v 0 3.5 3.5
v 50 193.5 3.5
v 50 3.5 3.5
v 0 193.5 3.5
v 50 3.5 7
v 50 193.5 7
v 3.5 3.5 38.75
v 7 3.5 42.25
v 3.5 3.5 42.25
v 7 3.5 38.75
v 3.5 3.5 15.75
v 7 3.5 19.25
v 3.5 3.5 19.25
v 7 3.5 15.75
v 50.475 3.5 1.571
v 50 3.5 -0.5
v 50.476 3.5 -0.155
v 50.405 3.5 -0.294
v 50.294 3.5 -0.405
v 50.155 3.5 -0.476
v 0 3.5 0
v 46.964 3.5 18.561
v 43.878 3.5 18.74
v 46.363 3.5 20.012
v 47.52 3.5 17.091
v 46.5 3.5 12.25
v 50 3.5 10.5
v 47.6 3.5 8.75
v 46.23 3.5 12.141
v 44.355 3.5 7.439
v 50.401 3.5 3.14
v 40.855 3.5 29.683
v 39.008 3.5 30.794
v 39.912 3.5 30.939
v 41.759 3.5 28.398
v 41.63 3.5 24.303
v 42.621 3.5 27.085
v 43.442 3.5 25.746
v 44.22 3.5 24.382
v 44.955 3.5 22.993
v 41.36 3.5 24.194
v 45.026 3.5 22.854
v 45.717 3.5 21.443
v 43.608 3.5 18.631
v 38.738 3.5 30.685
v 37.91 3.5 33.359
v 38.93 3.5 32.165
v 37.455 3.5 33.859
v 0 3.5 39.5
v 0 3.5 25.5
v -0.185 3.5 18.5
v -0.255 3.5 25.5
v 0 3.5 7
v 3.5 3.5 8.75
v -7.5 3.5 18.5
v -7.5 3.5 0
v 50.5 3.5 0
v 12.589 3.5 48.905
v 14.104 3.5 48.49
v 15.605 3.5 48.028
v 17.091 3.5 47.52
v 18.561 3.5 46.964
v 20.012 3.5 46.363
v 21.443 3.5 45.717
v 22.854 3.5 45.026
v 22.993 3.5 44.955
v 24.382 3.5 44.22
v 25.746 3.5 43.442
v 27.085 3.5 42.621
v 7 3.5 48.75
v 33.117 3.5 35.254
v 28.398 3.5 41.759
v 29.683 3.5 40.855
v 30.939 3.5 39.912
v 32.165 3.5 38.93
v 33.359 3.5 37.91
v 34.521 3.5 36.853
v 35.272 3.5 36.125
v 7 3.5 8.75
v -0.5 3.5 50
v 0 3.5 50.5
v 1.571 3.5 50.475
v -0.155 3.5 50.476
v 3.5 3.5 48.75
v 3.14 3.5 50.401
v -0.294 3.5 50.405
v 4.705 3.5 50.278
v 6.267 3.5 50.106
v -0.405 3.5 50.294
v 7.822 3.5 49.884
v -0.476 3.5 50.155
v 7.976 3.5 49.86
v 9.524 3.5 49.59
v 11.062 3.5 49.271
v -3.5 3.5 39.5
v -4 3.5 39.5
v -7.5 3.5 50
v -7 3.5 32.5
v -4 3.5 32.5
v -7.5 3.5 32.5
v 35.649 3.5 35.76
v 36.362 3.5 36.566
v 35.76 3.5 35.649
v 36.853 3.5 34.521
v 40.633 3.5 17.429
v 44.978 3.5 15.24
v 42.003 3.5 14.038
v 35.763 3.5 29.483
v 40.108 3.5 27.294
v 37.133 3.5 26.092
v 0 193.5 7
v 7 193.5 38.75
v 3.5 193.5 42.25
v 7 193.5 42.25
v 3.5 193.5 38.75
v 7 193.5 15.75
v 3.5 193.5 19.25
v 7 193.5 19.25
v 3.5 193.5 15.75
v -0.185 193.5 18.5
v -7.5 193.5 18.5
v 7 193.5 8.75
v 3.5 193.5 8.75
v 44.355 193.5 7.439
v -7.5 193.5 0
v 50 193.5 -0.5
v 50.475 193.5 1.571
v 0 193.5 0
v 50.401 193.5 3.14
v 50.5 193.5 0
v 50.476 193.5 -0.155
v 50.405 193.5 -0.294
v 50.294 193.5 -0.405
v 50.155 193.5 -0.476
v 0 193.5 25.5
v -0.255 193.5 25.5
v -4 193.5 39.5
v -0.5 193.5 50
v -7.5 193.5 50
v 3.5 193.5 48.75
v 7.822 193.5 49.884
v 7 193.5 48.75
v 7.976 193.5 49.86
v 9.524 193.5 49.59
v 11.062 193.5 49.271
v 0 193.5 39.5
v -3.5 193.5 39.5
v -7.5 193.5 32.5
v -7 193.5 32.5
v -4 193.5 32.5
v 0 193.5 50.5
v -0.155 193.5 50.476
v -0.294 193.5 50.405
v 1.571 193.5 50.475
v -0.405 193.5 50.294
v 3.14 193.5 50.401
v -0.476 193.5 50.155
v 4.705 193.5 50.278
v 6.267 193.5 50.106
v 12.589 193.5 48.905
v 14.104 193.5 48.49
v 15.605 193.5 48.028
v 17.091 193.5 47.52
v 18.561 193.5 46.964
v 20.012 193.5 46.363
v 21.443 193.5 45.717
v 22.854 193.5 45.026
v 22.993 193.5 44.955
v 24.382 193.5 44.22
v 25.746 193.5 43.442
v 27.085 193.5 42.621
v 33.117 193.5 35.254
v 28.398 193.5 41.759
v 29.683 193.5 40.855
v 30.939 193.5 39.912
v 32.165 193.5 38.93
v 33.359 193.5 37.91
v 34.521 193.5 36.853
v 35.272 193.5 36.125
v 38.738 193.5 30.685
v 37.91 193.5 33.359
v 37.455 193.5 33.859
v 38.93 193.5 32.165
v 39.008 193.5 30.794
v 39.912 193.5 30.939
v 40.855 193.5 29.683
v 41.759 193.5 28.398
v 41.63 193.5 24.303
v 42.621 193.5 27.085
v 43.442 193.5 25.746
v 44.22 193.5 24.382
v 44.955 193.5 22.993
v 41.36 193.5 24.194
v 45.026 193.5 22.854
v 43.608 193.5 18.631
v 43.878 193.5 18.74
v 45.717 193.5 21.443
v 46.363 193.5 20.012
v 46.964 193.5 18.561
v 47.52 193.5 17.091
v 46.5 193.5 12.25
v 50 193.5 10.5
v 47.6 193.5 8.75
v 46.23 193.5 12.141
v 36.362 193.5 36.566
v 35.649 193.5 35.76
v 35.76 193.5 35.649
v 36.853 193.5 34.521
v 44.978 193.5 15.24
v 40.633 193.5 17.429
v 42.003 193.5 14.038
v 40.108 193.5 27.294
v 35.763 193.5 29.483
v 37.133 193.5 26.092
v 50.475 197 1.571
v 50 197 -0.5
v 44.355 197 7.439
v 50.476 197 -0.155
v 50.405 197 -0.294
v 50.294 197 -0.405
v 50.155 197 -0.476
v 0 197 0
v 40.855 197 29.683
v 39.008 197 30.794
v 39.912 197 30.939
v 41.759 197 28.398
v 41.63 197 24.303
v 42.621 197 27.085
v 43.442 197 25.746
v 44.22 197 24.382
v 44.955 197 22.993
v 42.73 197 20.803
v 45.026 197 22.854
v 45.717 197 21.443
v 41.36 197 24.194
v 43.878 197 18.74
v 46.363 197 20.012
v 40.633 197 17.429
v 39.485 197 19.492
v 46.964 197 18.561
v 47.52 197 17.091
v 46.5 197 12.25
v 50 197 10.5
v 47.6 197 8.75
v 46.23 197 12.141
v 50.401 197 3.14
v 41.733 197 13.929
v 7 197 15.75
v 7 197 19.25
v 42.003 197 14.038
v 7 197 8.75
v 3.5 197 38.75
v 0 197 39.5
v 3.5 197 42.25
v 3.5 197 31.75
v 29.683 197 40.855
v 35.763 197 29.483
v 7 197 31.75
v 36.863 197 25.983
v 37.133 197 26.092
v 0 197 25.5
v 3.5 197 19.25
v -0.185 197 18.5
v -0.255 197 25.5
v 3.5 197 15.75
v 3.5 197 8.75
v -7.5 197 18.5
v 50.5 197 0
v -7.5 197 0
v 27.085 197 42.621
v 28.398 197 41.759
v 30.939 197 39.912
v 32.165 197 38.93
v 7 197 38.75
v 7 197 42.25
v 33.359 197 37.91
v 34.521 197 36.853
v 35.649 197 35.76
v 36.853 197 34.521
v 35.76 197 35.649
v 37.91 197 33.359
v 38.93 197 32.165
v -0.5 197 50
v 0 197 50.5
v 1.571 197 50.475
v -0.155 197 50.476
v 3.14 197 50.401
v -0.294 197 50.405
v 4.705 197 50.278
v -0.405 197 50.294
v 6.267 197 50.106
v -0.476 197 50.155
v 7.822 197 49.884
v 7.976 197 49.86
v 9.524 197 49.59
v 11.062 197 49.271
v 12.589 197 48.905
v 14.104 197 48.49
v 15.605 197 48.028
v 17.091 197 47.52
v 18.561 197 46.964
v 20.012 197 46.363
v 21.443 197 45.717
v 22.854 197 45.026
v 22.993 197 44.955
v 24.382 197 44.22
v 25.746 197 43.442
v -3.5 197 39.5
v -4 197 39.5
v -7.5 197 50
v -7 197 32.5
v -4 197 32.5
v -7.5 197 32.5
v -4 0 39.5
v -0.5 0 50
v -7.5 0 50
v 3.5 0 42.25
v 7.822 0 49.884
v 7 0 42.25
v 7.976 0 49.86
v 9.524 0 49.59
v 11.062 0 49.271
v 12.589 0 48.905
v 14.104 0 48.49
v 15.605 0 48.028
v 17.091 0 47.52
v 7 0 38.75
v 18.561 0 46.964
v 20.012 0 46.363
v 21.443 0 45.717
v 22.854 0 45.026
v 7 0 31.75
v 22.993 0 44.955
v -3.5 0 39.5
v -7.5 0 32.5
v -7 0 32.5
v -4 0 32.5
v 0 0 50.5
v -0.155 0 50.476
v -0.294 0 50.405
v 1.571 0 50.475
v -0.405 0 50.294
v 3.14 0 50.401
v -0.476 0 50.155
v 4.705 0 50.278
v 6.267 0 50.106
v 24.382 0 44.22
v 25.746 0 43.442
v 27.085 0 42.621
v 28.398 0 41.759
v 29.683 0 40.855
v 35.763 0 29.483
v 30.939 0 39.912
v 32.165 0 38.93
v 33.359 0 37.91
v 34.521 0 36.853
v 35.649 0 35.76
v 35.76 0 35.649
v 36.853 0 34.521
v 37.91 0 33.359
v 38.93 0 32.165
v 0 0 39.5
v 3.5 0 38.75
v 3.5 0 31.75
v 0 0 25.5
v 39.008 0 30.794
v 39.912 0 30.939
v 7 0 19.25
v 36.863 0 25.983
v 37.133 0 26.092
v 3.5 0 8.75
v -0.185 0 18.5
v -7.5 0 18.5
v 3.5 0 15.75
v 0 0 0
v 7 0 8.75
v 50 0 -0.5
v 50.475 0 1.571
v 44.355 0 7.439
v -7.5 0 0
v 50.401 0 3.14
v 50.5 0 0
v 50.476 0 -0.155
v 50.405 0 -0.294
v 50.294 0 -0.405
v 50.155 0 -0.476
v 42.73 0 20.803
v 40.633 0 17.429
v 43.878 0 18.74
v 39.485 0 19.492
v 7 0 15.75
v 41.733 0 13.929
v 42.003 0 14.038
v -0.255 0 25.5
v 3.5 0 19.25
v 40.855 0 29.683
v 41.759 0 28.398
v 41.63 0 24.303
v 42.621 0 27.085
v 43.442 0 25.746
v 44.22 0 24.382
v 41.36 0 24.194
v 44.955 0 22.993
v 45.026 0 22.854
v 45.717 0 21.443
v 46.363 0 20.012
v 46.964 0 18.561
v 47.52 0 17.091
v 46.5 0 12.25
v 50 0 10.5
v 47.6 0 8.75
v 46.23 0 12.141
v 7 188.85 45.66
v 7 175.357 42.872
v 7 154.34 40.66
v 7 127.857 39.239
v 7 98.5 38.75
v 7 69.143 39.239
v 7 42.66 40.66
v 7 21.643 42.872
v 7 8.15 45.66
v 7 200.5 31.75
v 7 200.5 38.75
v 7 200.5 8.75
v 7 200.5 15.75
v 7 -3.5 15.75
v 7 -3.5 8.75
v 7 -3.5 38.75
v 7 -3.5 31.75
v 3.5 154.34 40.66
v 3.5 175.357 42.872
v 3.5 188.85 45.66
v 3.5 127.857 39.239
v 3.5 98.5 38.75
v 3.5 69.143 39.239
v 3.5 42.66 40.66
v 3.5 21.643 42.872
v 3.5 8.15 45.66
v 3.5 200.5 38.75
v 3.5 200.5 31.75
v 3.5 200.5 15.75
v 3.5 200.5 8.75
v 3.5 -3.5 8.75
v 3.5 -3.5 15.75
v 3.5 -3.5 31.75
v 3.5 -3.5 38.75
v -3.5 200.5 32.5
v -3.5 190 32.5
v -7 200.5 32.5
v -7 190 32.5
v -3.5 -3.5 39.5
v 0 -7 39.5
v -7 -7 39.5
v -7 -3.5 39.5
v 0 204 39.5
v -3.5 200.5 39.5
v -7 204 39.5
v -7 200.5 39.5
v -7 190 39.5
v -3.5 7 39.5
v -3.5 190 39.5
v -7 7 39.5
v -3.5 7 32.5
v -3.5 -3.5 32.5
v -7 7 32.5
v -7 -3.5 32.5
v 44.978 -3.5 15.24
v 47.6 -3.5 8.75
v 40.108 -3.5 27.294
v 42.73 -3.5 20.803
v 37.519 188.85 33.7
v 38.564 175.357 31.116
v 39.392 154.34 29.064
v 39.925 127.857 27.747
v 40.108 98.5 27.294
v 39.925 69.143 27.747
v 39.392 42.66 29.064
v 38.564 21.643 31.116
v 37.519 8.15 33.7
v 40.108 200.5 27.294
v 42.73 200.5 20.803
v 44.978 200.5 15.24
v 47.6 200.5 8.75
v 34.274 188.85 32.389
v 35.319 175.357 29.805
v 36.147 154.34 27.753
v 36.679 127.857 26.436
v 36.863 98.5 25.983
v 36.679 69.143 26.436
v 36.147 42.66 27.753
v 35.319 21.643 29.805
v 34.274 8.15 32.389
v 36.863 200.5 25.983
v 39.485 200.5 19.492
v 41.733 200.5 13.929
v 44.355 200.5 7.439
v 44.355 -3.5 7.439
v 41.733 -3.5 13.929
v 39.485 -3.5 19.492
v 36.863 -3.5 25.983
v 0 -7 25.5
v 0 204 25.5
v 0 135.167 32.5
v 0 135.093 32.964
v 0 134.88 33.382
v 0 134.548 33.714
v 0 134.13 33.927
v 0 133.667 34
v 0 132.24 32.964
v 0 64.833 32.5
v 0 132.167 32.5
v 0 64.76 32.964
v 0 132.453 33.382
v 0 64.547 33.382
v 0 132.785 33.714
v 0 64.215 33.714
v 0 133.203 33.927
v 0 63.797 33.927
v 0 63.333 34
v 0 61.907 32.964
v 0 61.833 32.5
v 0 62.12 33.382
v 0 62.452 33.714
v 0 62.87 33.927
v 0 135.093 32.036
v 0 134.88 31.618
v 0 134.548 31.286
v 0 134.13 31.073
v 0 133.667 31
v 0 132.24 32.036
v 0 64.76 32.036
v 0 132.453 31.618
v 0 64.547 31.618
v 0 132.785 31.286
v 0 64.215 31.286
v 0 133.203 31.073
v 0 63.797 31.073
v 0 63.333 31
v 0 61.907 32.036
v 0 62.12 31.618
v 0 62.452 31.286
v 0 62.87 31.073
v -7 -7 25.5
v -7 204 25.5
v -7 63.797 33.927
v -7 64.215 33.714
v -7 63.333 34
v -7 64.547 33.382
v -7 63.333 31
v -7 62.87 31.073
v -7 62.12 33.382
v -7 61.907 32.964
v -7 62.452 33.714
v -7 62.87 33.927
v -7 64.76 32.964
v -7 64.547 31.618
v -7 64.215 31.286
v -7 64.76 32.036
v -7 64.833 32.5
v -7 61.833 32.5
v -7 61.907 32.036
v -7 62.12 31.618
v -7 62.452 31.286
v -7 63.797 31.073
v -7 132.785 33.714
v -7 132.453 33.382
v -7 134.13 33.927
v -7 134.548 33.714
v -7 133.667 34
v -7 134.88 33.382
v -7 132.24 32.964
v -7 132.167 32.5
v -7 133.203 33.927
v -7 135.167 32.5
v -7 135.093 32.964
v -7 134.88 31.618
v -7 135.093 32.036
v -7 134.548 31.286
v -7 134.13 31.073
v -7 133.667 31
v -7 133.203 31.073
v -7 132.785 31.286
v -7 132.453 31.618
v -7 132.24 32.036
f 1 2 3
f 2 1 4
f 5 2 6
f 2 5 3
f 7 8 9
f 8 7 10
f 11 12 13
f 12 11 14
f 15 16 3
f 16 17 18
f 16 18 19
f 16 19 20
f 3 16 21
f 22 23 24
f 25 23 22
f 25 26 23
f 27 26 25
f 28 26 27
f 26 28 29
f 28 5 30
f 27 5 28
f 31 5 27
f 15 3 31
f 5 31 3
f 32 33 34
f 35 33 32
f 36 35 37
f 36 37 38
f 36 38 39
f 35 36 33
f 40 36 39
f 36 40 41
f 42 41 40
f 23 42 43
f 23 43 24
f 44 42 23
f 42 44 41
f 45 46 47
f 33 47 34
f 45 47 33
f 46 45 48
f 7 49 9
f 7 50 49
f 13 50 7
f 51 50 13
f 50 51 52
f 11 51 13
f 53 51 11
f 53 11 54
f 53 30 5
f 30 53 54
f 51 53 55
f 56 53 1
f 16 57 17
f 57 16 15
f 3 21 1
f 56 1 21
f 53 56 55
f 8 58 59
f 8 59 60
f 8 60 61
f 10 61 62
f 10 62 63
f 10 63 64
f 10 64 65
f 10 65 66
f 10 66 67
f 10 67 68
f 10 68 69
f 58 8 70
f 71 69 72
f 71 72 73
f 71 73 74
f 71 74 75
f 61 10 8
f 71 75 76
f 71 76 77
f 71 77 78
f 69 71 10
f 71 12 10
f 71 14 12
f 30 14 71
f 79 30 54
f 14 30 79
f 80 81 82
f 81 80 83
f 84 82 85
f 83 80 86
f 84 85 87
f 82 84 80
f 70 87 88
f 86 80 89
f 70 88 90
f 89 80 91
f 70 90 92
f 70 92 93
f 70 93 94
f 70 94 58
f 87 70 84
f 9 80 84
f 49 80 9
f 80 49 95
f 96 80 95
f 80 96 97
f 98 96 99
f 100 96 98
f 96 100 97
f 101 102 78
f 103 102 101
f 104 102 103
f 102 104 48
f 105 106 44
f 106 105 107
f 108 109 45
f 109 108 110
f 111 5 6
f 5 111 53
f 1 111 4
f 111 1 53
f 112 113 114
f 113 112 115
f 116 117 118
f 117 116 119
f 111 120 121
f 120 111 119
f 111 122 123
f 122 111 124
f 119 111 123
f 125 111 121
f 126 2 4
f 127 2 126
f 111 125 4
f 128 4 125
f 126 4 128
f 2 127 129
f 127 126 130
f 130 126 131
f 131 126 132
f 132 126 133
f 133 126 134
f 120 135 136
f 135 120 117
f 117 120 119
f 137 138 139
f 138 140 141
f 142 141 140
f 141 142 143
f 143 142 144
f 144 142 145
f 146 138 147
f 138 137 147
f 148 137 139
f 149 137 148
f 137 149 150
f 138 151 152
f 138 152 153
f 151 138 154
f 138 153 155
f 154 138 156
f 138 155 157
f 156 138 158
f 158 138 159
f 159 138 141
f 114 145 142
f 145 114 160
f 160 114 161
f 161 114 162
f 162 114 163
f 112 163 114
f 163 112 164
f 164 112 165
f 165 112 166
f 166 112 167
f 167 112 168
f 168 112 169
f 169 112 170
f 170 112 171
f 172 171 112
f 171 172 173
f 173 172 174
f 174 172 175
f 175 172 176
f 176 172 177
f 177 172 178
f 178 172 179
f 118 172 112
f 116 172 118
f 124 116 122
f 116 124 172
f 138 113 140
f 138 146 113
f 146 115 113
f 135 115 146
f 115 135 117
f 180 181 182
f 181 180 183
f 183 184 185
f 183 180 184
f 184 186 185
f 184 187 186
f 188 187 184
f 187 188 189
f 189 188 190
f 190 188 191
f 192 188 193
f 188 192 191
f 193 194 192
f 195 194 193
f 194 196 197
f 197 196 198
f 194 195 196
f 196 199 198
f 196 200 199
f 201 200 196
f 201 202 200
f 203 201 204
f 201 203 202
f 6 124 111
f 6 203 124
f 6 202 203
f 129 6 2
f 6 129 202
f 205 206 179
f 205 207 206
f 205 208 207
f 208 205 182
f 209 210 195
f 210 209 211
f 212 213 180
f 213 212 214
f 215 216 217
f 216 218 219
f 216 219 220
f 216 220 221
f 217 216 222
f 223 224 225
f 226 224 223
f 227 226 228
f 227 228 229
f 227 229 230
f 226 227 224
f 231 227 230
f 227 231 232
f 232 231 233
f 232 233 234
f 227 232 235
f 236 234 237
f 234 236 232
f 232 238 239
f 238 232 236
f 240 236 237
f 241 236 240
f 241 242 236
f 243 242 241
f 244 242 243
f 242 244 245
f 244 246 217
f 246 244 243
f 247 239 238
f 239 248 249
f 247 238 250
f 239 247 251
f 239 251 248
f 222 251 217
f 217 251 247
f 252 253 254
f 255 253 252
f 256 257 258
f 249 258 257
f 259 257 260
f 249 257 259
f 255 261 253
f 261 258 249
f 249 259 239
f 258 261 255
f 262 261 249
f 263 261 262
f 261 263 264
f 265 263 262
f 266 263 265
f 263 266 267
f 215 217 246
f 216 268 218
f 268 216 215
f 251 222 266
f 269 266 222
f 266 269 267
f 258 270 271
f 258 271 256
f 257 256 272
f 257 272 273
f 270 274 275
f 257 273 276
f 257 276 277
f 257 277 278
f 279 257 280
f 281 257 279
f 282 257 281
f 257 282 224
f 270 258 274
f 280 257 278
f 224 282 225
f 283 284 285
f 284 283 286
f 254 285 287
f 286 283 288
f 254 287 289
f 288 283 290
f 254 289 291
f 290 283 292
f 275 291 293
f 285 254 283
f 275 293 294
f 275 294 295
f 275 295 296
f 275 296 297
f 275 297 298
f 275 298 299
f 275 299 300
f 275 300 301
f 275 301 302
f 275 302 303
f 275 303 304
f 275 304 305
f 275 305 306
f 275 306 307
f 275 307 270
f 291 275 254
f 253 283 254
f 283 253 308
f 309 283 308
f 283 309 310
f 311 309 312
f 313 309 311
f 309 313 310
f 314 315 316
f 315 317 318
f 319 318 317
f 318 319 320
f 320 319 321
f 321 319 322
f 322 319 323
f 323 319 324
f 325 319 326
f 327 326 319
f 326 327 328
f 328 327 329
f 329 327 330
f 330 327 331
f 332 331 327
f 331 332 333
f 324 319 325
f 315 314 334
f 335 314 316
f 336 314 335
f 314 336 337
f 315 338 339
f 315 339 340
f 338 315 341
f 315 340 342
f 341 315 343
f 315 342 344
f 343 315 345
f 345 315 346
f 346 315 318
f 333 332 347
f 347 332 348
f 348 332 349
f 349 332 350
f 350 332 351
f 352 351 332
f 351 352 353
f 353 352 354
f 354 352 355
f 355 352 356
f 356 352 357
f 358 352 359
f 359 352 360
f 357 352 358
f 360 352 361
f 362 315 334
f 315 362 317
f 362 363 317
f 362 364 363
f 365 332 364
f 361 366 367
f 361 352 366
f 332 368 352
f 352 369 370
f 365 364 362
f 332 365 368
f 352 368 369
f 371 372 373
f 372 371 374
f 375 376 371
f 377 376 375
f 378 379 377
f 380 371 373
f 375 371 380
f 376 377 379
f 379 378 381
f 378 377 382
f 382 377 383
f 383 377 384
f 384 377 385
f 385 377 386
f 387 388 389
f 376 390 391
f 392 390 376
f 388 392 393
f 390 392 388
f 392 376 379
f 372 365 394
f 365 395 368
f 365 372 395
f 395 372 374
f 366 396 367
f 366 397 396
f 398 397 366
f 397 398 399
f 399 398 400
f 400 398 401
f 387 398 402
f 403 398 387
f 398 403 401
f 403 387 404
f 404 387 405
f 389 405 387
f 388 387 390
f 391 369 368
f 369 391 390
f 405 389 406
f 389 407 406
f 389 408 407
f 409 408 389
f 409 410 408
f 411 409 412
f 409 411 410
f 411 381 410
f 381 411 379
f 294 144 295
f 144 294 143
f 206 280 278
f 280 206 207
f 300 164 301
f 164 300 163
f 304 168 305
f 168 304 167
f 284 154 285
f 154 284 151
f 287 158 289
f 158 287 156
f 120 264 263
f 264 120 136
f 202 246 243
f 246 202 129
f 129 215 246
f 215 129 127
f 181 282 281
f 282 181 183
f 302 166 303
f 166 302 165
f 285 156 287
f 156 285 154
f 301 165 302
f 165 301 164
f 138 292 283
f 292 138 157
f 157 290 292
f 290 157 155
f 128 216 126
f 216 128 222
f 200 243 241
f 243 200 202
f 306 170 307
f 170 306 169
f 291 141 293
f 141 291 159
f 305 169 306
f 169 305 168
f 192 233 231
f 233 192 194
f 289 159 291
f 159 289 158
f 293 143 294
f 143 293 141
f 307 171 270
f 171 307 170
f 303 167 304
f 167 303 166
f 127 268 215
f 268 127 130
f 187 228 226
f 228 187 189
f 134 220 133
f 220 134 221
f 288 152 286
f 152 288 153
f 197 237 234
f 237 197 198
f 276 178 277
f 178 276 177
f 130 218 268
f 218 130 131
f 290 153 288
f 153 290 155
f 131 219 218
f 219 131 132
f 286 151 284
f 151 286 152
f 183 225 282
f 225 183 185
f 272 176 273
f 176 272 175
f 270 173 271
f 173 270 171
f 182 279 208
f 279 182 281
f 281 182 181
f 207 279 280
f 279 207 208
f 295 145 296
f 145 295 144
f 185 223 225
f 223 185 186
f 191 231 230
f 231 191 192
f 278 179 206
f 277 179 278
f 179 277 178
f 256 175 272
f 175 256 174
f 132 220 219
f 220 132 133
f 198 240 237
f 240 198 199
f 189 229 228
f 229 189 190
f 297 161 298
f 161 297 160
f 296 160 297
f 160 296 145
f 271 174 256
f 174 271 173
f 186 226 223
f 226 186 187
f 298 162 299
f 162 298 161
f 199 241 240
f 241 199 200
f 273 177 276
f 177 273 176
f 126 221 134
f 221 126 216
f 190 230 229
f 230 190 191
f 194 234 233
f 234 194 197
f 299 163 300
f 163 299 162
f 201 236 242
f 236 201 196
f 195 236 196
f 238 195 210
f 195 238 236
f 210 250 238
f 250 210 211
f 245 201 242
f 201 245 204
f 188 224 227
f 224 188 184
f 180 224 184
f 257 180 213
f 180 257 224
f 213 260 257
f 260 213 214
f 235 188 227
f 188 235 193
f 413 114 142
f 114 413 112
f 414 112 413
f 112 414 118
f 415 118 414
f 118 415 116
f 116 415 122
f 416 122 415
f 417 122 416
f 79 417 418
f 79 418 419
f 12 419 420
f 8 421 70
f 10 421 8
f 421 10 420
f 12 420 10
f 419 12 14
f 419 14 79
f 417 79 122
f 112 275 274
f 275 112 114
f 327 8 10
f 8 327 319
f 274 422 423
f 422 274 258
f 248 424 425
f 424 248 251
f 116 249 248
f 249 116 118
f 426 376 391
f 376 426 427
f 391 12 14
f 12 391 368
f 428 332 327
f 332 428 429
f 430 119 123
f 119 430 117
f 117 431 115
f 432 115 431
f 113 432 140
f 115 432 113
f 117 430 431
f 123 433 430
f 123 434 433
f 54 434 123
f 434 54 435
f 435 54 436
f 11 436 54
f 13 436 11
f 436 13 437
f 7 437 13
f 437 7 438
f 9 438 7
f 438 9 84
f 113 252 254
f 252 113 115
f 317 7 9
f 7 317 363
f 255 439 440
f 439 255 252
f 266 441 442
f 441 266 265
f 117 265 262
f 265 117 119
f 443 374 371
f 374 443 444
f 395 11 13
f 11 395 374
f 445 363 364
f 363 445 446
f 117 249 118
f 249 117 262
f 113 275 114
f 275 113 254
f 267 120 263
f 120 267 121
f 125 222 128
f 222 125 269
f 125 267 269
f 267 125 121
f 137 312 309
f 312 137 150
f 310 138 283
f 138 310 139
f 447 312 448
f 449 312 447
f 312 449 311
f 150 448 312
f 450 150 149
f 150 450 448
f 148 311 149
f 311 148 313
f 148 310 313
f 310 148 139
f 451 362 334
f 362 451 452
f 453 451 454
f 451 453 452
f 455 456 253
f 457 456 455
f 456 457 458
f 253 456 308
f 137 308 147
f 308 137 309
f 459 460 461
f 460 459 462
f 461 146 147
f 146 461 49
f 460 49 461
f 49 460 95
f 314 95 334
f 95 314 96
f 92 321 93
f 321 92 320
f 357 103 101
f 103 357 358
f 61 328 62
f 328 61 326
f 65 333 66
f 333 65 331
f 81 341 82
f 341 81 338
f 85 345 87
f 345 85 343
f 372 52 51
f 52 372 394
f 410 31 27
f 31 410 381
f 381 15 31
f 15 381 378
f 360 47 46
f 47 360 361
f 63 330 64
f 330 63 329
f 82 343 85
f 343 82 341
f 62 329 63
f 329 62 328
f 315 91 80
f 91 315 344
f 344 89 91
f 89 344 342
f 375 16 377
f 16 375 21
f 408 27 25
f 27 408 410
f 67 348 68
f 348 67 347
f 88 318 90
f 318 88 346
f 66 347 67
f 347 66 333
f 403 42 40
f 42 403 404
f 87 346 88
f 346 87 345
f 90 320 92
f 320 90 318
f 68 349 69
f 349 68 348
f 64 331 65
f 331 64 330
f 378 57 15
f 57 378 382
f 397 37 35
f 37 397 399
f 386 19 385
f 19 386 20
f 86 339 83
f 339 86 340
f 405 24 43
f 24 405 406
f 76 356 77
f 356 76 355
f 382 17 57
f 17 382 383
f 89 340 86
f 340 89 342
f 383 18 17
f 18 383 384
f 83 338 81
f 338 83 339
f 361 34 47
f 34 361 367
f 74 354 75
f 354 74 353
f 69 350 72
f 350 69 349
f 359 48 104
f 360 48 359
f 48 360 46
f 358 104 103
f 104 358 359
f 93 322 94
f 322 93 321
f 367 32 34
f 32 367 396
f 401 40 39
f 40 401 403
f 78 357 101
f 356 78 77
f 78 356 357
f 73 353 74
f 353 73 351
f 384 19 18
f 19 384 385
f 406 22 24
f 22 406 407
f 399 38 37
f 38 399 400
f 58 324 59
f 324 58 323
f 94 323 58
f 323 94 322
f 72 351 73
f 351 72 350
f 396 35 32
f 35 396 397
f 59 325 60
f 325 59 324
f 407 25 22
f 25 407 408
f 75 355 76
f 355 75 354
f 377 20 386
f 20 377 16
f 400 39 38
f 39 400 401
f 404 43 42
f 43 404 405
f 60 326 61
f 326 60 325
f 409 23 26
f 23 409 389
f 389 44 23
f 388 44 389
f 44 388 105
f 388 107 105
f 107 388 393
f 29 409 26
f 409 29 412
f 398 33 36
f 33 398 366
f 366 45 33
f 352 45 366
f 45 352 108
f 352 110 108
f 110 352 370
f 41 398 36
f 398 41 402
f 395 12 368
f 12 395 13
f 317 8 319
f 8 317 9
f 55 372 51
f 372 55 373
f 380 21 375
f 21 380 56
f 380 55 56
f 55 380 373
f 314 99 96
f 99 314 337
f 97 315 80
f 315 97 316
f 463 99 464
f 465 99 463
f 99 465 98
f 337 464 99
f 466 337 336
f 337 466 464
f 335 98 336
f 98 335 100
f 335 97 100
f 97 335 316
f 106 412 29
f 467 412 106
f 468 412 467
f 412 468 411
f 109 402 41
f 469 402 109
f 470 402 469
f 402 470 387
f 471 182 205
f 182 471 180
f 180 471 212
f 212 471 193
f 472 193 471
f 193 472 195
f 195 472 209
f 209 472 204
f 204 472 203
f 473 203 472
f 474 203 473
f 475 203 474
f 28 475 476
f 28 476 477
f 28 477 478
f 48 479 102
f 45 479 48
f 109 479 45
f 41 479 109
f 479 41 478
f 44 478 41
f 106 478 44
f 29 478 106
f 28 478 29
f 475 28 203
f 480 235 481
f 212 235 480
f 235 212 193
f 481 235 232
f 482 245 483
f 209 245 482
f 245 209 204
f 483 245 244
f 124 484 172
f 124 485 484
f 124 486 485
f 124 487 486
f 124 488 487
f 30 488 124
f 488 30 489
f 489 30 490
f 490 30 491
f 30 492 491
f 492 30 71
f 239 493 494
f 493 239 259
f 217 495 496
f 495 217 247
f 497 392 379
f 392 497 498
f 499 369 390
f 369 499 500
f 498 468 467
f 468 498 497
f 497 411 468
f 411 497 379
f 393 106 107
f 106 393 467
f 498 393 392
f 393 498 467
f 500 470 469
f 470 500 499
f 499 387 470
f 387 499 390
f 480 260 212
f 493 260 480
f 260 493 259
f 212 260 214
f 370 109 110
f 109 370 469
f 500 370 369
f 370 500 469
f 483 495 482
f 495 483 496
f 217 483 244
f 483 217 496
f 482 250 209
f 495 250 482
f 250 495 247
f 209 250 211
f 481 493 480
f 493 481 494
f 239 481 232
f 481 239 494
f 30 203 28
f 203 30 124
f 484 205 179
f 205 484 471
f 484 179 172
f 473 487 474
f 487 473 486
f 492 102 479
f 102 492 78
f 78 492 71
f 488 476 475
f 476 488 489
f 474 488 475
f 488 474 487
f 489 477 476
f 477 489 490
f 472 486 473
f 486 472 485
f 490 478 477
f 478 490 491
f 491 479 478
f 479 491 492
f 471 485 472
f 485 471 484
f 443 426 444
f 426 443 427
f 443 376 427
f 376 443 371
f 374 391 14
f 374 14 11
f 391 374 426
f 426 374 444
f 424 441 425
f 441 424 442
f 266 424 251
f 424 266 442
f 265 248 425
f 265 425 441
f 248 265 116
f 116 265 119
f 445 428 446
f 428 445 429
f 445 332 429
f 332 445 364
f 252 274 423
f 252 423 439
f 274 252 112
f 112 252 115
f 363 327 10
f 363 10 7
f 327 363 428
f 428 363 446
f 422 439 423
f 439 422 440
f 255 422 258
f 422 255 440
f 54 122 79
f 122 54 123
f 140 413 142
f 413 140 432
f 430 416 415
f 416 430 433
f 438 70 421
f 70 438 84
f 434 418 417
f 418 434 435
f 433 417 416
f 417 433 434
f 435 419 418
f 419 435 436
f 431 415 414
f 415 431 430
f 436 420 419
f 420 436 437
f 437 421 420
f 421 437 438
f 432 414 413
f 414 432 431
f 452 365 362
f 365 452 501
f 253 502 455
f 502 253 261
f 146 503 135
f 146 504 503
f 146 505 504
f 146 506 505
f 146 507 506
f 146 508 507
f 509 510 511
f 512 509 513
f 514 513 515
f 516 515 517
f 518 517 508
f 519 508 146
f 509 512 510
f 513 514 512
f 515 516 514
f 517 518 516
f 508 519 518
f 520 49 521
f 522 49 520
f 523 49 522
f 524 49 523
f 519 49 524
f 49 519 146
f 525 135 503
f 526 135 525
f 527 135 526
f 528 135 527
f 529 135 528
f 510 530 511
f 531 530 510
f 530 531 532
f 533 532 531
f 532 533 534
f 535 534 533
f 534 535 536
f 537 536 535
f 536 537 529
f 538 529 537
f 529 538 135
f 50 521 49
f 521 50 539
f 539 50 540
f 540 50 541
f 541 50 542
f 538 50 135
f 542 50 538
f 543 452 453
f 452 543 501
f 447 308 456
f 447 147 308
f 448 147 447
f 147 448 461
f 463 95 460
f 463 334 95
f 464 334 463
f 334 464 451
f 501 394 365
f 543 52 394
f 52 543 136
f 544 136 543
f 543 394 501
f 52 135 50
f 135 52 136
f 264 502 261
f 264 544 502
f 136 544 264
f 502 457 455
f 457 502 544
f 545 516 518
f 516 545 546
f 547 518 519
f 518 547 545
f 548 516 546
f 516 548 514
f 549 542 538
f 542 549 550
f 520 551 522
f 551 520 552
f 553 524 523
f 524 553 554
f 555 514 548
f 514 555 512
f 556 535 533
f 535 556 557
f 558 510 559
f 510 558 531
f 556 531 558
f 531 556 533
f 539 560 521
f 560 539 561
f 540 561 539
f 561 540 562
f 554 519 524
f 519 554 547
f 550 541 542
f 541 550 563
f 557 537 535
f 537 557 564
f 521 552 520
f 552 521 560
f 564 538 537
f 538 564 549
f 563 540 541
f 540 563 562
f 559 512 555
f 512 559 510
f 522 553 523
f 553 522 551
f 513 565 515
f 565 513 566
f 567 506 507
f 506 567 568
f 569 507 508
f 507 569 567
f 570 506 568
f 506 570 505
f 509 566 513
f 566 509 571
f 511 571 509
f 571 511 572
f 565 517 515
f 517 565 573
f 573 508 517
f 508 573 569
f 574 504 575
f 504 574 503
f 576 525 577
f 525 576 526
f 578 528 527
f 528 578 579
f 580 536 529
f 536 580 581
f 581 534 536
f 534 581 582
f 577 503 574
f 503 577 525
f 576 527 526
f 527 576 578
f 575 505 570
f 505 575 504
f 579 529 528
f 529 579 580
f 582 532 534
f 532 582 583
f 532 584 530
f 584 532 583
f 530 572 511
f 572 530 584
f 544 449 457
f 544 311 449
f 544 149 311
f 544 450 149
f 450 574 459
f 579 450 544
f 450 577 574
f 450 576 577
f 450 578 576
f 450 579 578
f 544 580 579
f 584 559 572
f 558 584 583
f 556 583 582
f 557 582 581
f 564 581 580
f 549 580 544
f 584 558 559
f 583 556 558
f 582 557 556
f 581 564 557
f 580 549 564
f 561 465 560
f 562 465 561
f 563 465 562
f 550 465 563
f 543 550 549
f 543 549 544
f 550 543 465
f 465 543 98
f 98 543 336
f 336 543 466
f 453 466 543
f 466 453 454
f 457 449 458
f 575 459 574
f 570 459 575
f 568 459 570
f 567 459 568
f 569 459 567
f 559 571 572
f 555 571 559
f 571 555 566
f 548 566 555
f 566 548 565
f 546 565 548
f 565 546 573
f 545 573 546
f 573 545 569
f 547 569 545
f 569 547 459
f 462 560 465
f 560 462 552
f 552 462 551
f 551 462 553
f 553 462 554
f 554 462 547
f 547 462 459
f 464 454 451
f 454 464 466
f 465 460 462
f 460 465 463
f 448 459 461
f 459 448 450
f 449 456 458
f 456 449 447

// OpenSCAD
//laser cut display tray
// for hanging or standing
// v0 by t b mosich

// script for generating hanging/standing display/tool/spicerack trays for laser cutting
// work in progress; code is not exemplary
// todo: alternate press-fit connector instead of hooks? 
// todo: some modules use thickness but should use material_thickness


model_view = 1;
// 1 == 3d assembled view
// 2 == 2d flat projection for laser cutting
// 3 == 3d parts disasembled

// use model_view = 2, then render (F6),
// then export as e.g. .pdf to get outlines for cutting


// units millimeters
// smallest functional tray ~4cm wide x ~2cm deep depending on thickness

//example measurements
//business card eu 54 x 85 mm
//magazine a4 210 × 297 mm


material_thickness = 3.00; // material thickness in mm
kerf_thickness = 0.5; // kerf or adjustment to cutouts; this may need to be set differently for different material types or thicknesses
thickness = material_thickness+kerf_thickness; // combined thickness

bottom_depth=50; // depth of the base plate; 
                 // usable depth will be less due to back and front being inset
inside_width=190; // inside width of tray; total width should be inside_width+4*thickness

side_height=50;
side_hanging_hook=true; // set to false if you do not want the hooks or the brackets
side_hook_z_offset_mult=1; //position of hanging hook, 0=top
screw_diam=3; // for the bracket

front_lip_height=20;
front_lip_angle=22;
front_lip_offset_z=thickness;
front_lip_offset_x=bottom_depth-thickness*1;
front_lip_extra_height=20; // height of optional extra front lip part

back_height=30; // the "inside" back part should be less than side_height 
back_angle=0;
back_offset_z=thickness;
back_offset_x=thickness*2;
back_extra_height=20; // height of optional extra back part

// optional divider
divider=false;
divider_height=60;
divider_angle=5;
divider_offset_z=thickness;
divider_offset_x=bottom_depth/2+thickness;
divider_extra_height=40;
divider_extra_shape = "rounded2";

// side panel shape options -- "square", "triangle", "curved", "house", "forward_slant"
side_shape = "curved";

// back panel & front lip extra shape options -- "square", "rounded", "rounded2", "rounded3", "angular", "arrow", "trapezoid"
back_extra_shape = "rounded3";
front_lip_extra_shape = "rounded3";

// global $fn value for circle smoothness; high values will make rendering SLOW
$fn = 20;

//experimental wip
mirror=false;






module bottom_plate() {  
union(){
    translate([0,thickness,thickness])
    create_square(thickness=thickness, x=bottom_depth, y=inside_width);
    
    translate([thickness,inside_width+thickness,thickness]) 
    cube([3*thickness, thickness, thickness]);
    
    translate([bottom_depth-4*thickness,inside_width+thickness,thickness]) 
    cube([3*thickness, thickness, thickness]);

    translate([thickness,0,thickness]) 
    cube([3*thickness, thickness, thickness]);
    
    translate([bottom_depth-4*thickness,0,thickness]) 
    cube([3*thickness, thickness, thickness]);
 }
}


module create_bracket() {
    color("brown", 0.75) {
        create_square_w_screwholes(thickness, 4 * thickness, inside_width + 6 * thickness, screw_diam, inside_width);
    }
}

module bracket() {
    if (side_hanging_hook) {
        if (model_view == 1) {
            translate([0, -2 * thickness, side_height - 6 * thickness - side_hook_z_offset_mult * thickness]) {
                rotate([0, -90, 0]) {
                    create_bracket();
                }
            }
        } else {
            create_bracket();
        }
    }
}



module create_bracket2() {
    difference() {
        color("grey", 0.65) {
            create_square_w_screwholes(thickness, 4 * thickness, inside_width + 6 * thickness, screw_diam, inside_width);
        }
        translate([2 * thickness, thickness,  - 2 * thickness]) {
            create_colored_square(4 * thickness, 6 * thickness, 3 * thickness, "pink");
        }
        translate([2 * thickness, inside_width+2*thickness,  - 2 * thickness]) {
            create_colored_square(4 * thickness, 6 * thickness, 3 * thickness, "pink");
        }
    } 
}

module bracket2() {
    if (side_hanging_hook) {
        if (model_view == 1) {
            translate([-thickness, -2 * thickness, side_height - 6 * thickness - side_hook_z_offset_mult * thickness]) {
                rotate([0, -90, 0]) {
                    create_bracket2();
                }
            }
        } else {
            create_bracket2();
        }
    }
}





module back_plate(shape_type) {
    if (model_view == 1) {
        translate([2 * thickness, thickness, 2 * thickness + thickness / 2]) {
            rotate([0, -90, 0]) {
                create_back_plate(shape_type);
            }
        }
    } else {
                create_back_plate(shape_type);
    }
}

module create_back_plate(shape_type) {
    union() {
        create_colored_square(thickness, back_height, inside_width, "green");

        place_hook_connector(thickness, 0, 0, thickness, 0, 180, -90, "green");
        place_hook_connector(thickness, 0, back_height - 2 * thickness, thickness, 0, 180, -90, "green");
        place_hook_connector(thickness, -inside_width, 0, 0, 0, 0, -90, "green");
        place_hook_connector(thickness, -inside_width, back_height - 2 * thickness, 0, 0, 0, -90, "green");

        color("green", 0.65) {
            translate([back_height, 0, 0]) {
                extra_part_shape(thickness, back_extra_height, inside_width, shape_type);
            }
        }
    }
}






module extra_part_shape(thickness, x, y, shape_type) {
    if (shape_type == "square") {
        lasercutoutSquare(thickness = thickness, x = x, y = y);
    } else if (shape_type == "rounded") {
        union() {
            linear_extrude(thickness) {
                square([x/2, y]);
            }
translate([x/2, y/2]) {
    scale([x/y, 1, 1]) {
        linear_extrude(thickness) {
            circle(d = y);
        }
    }
}
        }
    } else if (shape_type == "rounded2") {

translate([0, y/2]) {
    scale([x/y, 1, 1]) {
        difference() {
            linear_extrude(thickness) {
                circle(d = y);
            }
            // Create a cube to cut off the bottom half of the circle
            translate([-x, -y/2, -thickness]) cube([x, y, thickness*3]);
        }
    }
}
      
    }
     else if (shape_type == "rounded3") {
difference() {
       //union() {
            linear_extrude(thickness) {
                square([x/2, y]);
            }
translate([x/2, y/2, -thickness]) {
    scale([x/y, 1, 1]) {
        linear_extrude(thickness*3) {
            circle(d = y);
        }
    }
}
        }
//}
      
    }
    
    else if (shape_type == "angular") {
        linear_extrude(thickness) {
            polygon(points = [[x/2, thickness], [0, 0], [0, y], [x/2, y-thickness], [x, y-y/3], [x, y/3]]);
        }

}else if (shape_type == "arrow") {
        linear_extrude(thickness) {
polygon(points = [[x/4, y/3], [-thickness*1, y/2], [x/4, y-y/3], [x, y-y/3], [x/2, y/2], [x, y/3]   ]);
        }
    } else if (shape_type == "trapezoid") {
        linear_extrude(thickness) {
            polygon(points = [[x, thickness*2], [0, 0], [0, y], [x, y-thickness*2]]);
        }
    }
}

///// side plate
/// this is a bit of a mess,
// but hard to refactor as we are positioning the holes in 3d space,
// according to the other parts
// this means there are several nested translates

module side_platev2(pos, shape_type) {    
 union(){
    
    difference(){   
    color("blue",0.75) 
    translate([0,pos+thickness,0]) 
    rotate([90,0,0]) 

    //shape of the side panel
    // Generate a side with a 'shape' edge
    side_shape(thickness = thickness, bottom_depth = bottom_depth, side_height = side_height, shape_type = shape_type);


   //cutouts
        //front lip
    translate([thickness,pos-thickness/2,thickness]) 
    cube([3*thickness, 2*thickness, thickness]);
    
    translate([bottom_depth-4*thickness,pos-thickness/2,thickness]) 
    cube([3*thickness, 2*thickness, thickness]);
    
    translate([front_lip_offset_x,pos+thickness,2*thickness+thickness/2+front_lip_offset_z])   
    rotate([0,-90-front_lip_angle,0])
  
    translate([0,-2*thickness,thickness]) 
    rotate([0,180,-90]) 
    cube([3*thickness, 2*thickness, thickness]);

    translate([front_lip_offset_x,pos+thickness,2*thickness+thickness/2+front_lip_offset_z])   
    rotate([0,-90-front_lip_angle,0])

    translate([front_lip_height-2*thickness,-2*thickness,thickness]) 
    rotate([0,180,-90]) 
    cube([3*thickness, 2*thickness, thickness]);
    
       // divider
    if (divider==true){
    translate([thickness,pos-thickness/2,thickness]) 
    cube([3*thickness, 2*thickness, thickness]);
    
    translate([bottom_depth-4*thickness,pos-thickness/2,thickness]) 
    cube([3*thickness, 2*thickness, thickness]);
    
    translate([divider_offset_x,pos+thickness,2*thickness+thickness/2+divider_offset_z])   
    rotate([0,-90-divider_angle,0])
    
    translate([0,-2*thickness,thickness]) 
    rotate([0,180,-90]) 
    cube([3*thickness, 2*thickness, thickness]);

    translate([divider_offset_x,pos+thickness,2*thickness+thickness/2+divider_offset_z])   
    rotate([0,-90-divider_angle,0])

    translate([divider_height-2*thickness,-2*thickness,thickness]) 
    rotate([0,180,-90]) 
    cube([3*thickness, 2*thickness, thickness]);
    }
       //back

    translate([thickness,pos-thickness/2,thickness]) 
    cube([3*thickness, 2*thickness, thickness]);
    
    translate([bottom_depth-4*thickness,pos-thickness/2,thickness]) 
    cube([3*thickness, 2*thickness, thickness]);
    
    translate([back_offset_x,pos+thickness,2*thickness+thickness/2+back_offset_z])   
    rotate([0,-90-back_angle,0])
    
    translate([0,-2*thickness,thickness]) 
    rotate([0,180,-90]) 
    cube([3*thickness, 2*thickness, thickness]);

    translate([back_offset_x,pos+thickness,2*thickness+thickness/2+back_offset_z])   
    rotate([0,-90-back_angle,0])

    translate([back_height-2*thickness,-2*thickness,thickness]) 
    rotate([0,180,-90]) 
    cube([3*thickness, 2*thickness, thickness]);
    
   }
   //side back part hook
if (side_hanging_hook == true) {
    color("blue", 0.55)
    translate([-2 * thickness - kerf_thickness, pos, 0])
        cube([2 * thickness + kerf_thickness, thickness, side_height - 8 * thickness - thickness * side_hook_z_offset_mult]);
    
    color("blue", 0.65)
    translate([-2 * thickness - kerf_thickness, pos, side_height - 4 * thickness - thickness * side_hook_z_offset_mult])
        cube([thickness, thickness, 4 * thickness + thickness * side_hook_z_offset_mult]);
    
    color("blue", 0.75)
    translate([-thickness - kerf_thickness, pos, side_height - 2 * thickness - thickness * side_hook_z_offset_mult])
        cube([thickness + kerf_thickness, thickness, 2 * thickness + thickness * side_hook_z_offset_mult]);
}
   }
}


module side_shape(thickness, bottom_depth, side_height, shape_type = "triangle") {
        if (shape_type == "square") {
        square_edge_shape(thickness, bottom_depth, side_height); 
        } else if (shape_type == "triangle") {
        straight_edge_shape(thickness, bottom_depth, side_height);
    } else if (shape_type == "curved") {
        curved_edge_shape(thickness, bottom_depth, side_height);
    } else if (shape_type == "forward_slant") {
        rounded_edge_shape(thickness, bottom_depth, side_height);
    } else if (shape_type == "house") {
        house_edge_shape(thickness, bottom_depth, side_height);
    } else {
        echo("Invalid shape type specified.");
    }
}

module straight_edge_shape(thickness, bottom_depth, side_height) {
    hull() {
        linear_extrude(thickness) {
            square([bottom_depth, 3 * thickness]);
        }
        translate([0, 5]) {
            linear_extrude(thickness) {
                square([3 * thickness, side_height - 5]);
            }
        }
    }
}

module square_edge_shape(thickness, bottom_depth, side_height) {
    hull() {
        linear_extrude(thickness) {
            square([bottom_depth, side_height]);
        }
    }
}

module curved_edge_shape(thickness, bottom_depth, side_height) {
    num_points = 50; // Increase this number to make the curve smoother
    points = [
        [0, 0],
        [bottom_depth, 0],
        [0, side_height]
    ];

    hull() {
        // Extrude the base square
        linear_extrude(thickness) {
            square([bottom_depth, 3 * thickness]);
        }
        
        // Create a circular arc to form the curved hypotenuse
        for (i = [0 : num_points]) {
            angle = 90 * i / num_points;
            translate([bottom_depth * cos(angle), side_height * sin(angle)]) {
                linear_extrude(thickness) {
                    circle(d = 1);
                }
            }
        }
    }
}

// rounded forward slant
module rounded_edge_shape(thickness, bottom_depth, side_height) {
    hull() {
        linear_extrude(thickness) {
            square([bottom_depth, 3 * thickness]);
        }
        translate([0, side_height]) {
            union() {
                linear_extrude(thickness) {
                    square([bottom_depth, thickness]);
                }
                translate([bottom_depth, -side_height/3, 0]) {
                    linear_extrude(thickness) {
                        circle(d = thickness*12);
                    }
                }
            }
        }
    }
}



// house edge shape 
module house_edge_shape(thickness, bottom_depth, side_height) {
       difference() {
    hull() {
        linear_extrude(thickness) {
            square([bottom_depth, 3 * thickness]);
        }
        translate([0, side_height]) {
            linear_extrude(thickness) {
                polygon(points = [[0, 0], [bottom_depth / 2, side_height / 2], [bottom_depth, 0]]);
            }
        }
    }

    // Define window-like cutout shape (four squares)
 
    translate([bottom_depth / 2, side_height / 4* 3, -thickness]) cube([thickness * 3, thickness * 3, thickness * 3]); 
    translate([bottom_depth / 2, side_height / 4* 3 -thickness * 3.4, -thickness]) cube([thickness * 3, thickness * 3, thickness * 3]);
    translate([bottom_depth / 2-thickness * 3-thickness/3, side_height / 4* 3, -thickness]) cube([thickness * 3, thickness * 3, thickness * 3]); 
    translate([bottom_depth / 2-thickness * 3-thickness/3, side_height / 4* 3 -thickness * 3.4, -thickness]) cube([thickness * 3, thickness * 3, thickness * 3]);
    }
}

// front lip / divider

module front_lip(height, angle, offset_z, offset_x, extra_height, shape_type) {
    if (model_view == 1) {
    union() {
        translate([ offset_x + angle / 20, thickness, 2 * thickness + thickness / 2 + offset_z - thickness]) {
            rotate([0, -90 - angle, 0]) {
                create_font_lip_main(thickness, inside_width, height=height);    
                  color("purple", 0.55)
                    translate([height, 0, 0])
                    extra_part_shape(thickness, extra_height, inside_width, shape_type = shape_type);
                
            }
        }
    }
    } else {
        // If not model_view == 1, do not do fancy rotate and translate
        union() {
         create_font_lip_main(thickness, inside_width, height);
          color("purple", 0.55)
                    translate([height, 0, 0])
                    extra_part_shape(thickness, extra_height, inside_width, shape_type = shape_type);
    }
}
}

module create_font_lip_main(thickness, inside_width, height) {
    union() {
        color("purple", 0.75) {
            create_square(thickness = thickness, x = height, y = inside_width);
        }
        place_hook_connector(thickness, 0, 0, thickness, 0, 180, -90, "purple");
        place_hook_connector(thickness, 0, height-2*thickness, thickness, 0, 180, -90, "purple");
        place_hook_connector(thickness, -inside_width, 0, 0, 0, 0, -90, "purple");
        place_hook_connector(thickness, -inside_width, height-2*thickness, 0, 0, 0, -90, "purple");
    }
}




module create_square_w_screwholes(thickness, x, y, screw_diam, inside_width) {
    difference() {
    // Create the square base
    create_square(thickness, x, y);

    // Create the symmetrical round cutouts
    // Calculate the positions for the holes
    hole_offset_x = x / 2;
    hole_offset_y = y / 3;

    // Create the holes
 
        // Left hole
        translate([hole_offset_x, hole_offset_y, thickness / 2]) {
            cylinder(h = thickness * 3, d = screw_diam, center = true);
        }

        // Right hole (symmetrical to the left hole)
        translate([x - hole_offset_x, hole_offset_y*2, thickness / 2]) {
            cylinder(h = thickness * 3, d = screw_diam, center = true);
        }
    }
}

module create_colored_square(thickness, x, y, color_value) {
    color(color_value, 0.75) {
       // lasercutoutSquare(thickness = thickness, x = x, y = y);
        create_square(thickness, x, y);
    }
}

module create_square(thickness, x, y) {
        points = [[0,0], [x,0], [x,y], [0,y], [0,0]];
       linear_extrude(height = thickness , center = false)  polygon(points=points);
    
}


module place_hook_connector(thickness, pos_x, pos_y, pos_z, rot_x, rot_y, rot_z, color_value) {
    color(color_value, 0.75) {
        // First, apply the initial translation and rotation
        translate([0, 0, pos_z]) {
            rotate([rot_x, rot_y, rot_z]) {
                // Then, apply the translation along the local x-axis
                translate([pos_x, pos_y, 0]) {
                    // Finally, place the hook connector
                    hook_connector(thickness);
                }
            }
        }
    }
}

// Function to create a hook connector
module hook_connector(thickness) {
    // The length of the part that connects to the object
    length_connect = 2 * thickness;
    // The width of the hook (can be adjusted as needed)
    width = thickness;

    // Part that connects to the object
    translate([-length_connect, 0, 0])
    cube([width, thickness, thickness]);

    // Hook part (rotated by 90 degrees and translated)
    translate([0, thickness, 0])
    rotate([0, 0, 90])
    cube([width, length_connect, thickness]);
}




// Example usage

//3d assembled model
if (model_view == 1 && mirror==false) {
    bottom_plate();
    side_platev2(pos=inside_width+thickness, shape_type = side_shape);
    side_platev2(pos=0, shape_type = side_shape);

    front_lip(height = front_lip_height, angle = front_lip_angle, offset_z = front_lip_offset_z, offset_x = front_lip_offset_x, extra_height = front_lip_extra_height, shape_type = front_lip_extra_shape);
    if (divider==true){
        front_lip(height = divider_height, angle = divider_angle, offset_z = divider_offset_z, offset_x = divider_offset_x, extra_height = divider_extra_height, shape_type = divider_extra_shape);
    }
    
    
front_lip(height = back_height, angle = back_angle, offset_z = back_offset_z, offset_x = back_offset_x, extra_height = back_extra_height, shape_type = back_extra_shape);
    //back_plate(shape_type = back_extra_shape);
    
    
    
    bracket();  
    bracket2();
    } 
    
    
    // wip
    else if(model_view == 1 && mirror==true) {
        
     side_platev2(pos=0, shape_type = side_shape);       
        
    translate([0 , thickness, 0])
    rotate([0, 0, 180])
    side_platev2(pos=0, shape_type = side_shape);
    
    //translate([-bottom_depth+thickness/2 , 0, 0])    
    front_lip(height = back_height, angle = back_angle, offset_z = back_offset_z, offset_x = back_offset_x, extra_height = back_extra_height, shape_type = back_extra_shape);
        
    }
    

    
//3d disassembled
else if (model_view == 3) {
    // Bottom plate
    translate([0 , thickness, -thickness]) {
        bottom_plate();
    }

    // Side plate 1
   // translate([2 * thickness, inside_width  + 5 * thickness, -side_height - 3*thickness]) {
     //   rotate([90, 0, 0]) {
           // side_platev2(pos = inside_width + thickness, shape_type = side_shape);
      //  }
  //  }

    // Side plate 2
    translate([0, inside_width + 12 * thickness, 0]) {
        rotate([90, 0, 90]) {
            side_platev2(pos = 0, shape_type = side_shape);
        }
    }
    
        translate([side_height+thickness, inside_width + 12 * thickness, 0]) {
        rotate([90, 0, 90]) {
            side_platev2(pos = 0, shape_type = side_shape);
        }
    }

    // Front lip
    translate([bottom_depth + back_height + back_extra_height + 2*thickness, 2*thickness, 0])
    front_lip(height = front_lip_height, angle = front_lip_angle, offset_z = front_lip_offset_z, offset_x = front_lip_offset_x, extra_height = front_lip_extra_height, shape_type = front_lip_extra_shape);
    
    if (divider==true){
         translate([bottom_depth + back_height + back_extra_height + front_lip_height + front_lip_extra_height + 3*thickness, 2*thickness, 0])
        front_lip(height = divider_height, angle = divider_angle, offset_z = divider_offset_z, offset_x = divider_offset_x, extra_height = divider_extra_height, shape_type = divider_extra_shape);
    }

    // Back plate
translate([bottom_depth + thickness, 2*thickness, 0])
          //  back_plate(shape_type = back_extra_shape);
    front_lip(height = back_height, angle = back_angle, offset_z = back_offset_z, offset_x = back_offset_x, extra_height = back_extra_height, shape_type = back_extra_shape);


    // Bracket 1
    translate([0, inside_width + 9 * thickness, 0]) {
        rotate([0, 0, -90]) {
            bracket();
        }
    }

    // Bracket 2
    translate([inside_width+7*thickness, inside_width + 9 * thickness, 0]) {
        rotate([0, 0, -90]) {
            bracket2();
        }
    }
}


 //   
 // 2d projected flat
else if (model_view == 2) {
    
    projection(cut = false) {
    
    
        translate([0, thickness, -thickness]) {
            bottom_plate();
        }

    translate([0, inside_width + 12 * thickness, 0]) {
        rotate([90, 0, 90]) {
            side_platev2(pos = 0, shape_type = side_shape);
        }
    }

    translate([side_height + thickness*10, inside_width + 12 * thickness, 0]) {
        rotate([90, 0, 90]) {
            side_platev2(pos = 0, shape_type = side_shape);
        }
    }

    translate([bottom_depth + back_height + back_extra_height + 2 * thickness, 2 * thickness, 0]) {
        front_lip(
            height = front_lip_height,
            angle = front_lip_angle,
            offset_z = front_lip_offset_z,
            offset_x = front_lip_offset_x,
            extra_height = front_lip_extra_height,
            shape_type = front_lip_extra_shape
        );
    }

    if (divider == true) {
        translate([bottom_depth + back_height + back_extra_height + front_lip_height + front_lip_extra_height + 3 * thickness, 2 * thickness, 0]) {
            front_lip(
                height = divider_height,
                angle = divider_angle,
                offset_z = divider_offset_z,
                offset_x = divider_offset_x,
                extra_height = divider_extra_height,
                shape_type = divider_extra_shape
            );
        }
    }

    translate([bottom_depth + thickness, 2 * thickness, 0]) {
       /// back_plate(shape_type = back_extra_shape);
        front_lip(height = back_height, angle = back_angle, offset_z = back_offset_z, offset_x = back_offset_x, extra_height = back_extra_height, shape_type = back_extra_shape);
    }

        // Bracket 1
    translate([0, inside_width + 9 * thickness, 0]) {
        rotate([0, 0, -90]) {
            bracket();
        }
    }

    // Bracket 2
    translate([inside_width + 7 * thickness, inside_width + 9 * thickness, 0]) {
        rotate([0, 0, -90]) {
            bracket2();
        }
    }
    }
}
